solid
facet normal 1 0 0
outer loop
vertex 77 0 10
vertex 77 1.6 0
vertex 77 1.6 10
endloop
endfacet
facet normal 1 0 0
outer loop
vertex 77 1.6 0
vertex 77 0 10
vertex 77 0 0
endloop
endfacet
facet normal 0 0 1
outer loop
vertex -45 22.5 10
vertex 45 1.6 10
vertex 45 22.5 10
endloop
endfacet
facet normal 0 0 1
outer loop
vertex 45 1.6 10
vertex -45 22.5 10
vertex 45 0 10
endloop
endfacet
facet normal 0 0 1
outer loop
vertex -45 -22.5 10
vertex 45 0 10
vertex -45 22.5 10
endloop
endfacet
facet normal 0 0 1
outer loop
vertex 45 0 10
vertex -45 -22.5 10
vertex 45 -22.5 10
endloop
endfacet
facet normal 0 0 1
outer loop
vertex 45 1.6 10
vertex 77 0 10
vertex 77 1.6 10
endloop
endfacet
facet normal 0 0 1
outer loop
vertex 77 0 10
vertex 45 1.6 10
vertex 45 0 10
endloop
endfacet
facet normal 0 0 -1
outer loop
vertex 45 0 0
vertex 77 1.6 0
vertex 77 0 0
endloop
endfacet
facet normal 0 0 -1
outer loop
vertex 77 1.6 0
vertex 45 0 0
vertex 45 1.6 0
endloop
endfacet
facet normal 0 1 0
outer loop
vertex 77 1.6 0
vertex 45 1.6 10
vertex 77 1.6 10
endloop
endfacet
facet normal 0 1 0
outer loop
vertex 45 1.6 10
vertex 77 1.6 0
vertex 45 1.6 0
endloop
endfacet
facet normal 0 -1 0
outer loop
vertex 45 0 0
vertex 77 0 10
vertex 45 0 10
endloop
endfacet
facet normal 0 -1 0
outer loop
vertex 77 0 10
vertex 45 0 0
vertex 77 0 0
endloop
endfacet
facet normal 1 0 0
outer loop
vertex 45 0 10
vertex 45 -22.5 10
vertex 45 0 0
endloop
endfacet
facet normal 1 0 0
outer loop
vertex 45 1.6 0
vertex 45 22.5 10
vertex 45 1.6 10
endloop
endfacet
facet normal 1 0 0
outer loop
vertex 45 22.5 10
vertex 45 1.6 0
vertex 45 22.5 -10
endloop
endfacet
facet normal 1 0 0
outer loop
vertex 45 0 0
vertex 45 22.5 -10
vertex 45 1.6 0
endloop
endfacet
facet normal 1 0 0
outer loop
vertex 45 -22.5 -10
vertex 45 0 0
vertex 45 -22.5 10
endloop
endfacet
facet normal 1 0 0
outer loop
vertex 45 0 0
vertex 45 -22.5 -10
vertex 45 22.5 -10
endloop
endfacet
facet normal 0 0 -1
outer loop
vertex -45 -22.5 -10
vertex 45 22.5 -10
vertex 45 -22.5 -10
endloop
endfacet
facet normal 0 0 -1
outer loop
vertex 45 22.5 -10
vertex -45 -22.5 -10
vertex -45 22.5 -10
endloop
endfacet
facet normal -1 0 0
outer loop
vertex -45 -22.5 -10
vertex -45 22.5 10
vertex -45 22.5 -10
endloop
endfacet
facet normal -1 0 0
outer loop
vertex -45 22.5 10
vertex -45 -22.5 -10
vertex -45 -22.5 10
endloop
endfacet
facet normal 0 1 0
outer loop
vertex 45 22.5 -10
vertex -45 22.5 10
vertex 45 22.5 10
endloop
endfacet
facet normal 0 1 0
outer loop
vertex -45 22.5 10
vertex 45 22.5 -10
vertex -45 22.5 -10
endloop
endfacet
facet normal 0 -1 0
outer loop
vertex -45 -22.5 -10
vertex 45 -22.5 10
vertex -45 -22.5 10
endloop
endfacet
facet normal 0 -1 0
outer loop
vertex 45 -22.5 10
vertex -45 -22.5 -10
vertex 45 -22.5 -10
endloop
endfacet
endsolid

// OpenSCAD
// Dimensions for the Drying Rack
// Base Block Dimensions
base_length = 90;  // Length of the base block along X axis (mm)
base_width = 45;    // Width of the base block along Y axis (mm)
base_height = 20;   // Height of the base block along Z axis (mm)

// Slide Slot Dimensions
num_slots = 10;     // Number of slots to create
slot_length = 77;   // Length of each slot along X axis (mm)
slot_width = 1.6;    // Width of each slot along Y axis (mm)
slot_depth = 10;     // Depth of the slot along Z axis (mm)
slot_spacing = 3.5;  // Center-to-center spacing between slots in Y direction (mm)

// Slot Positioning Calculations
// The slots are centered on the block in X and Y.

// Calculate the total required width for the slots and gaps:
// Total span occupied by slots and gaps along Y axis:
// Span = (num_slots - 1) * slot_spacing + slot_width
total_span = (num_slots - 1) * slot_spacing + slot_width;

// Center of the block in Y: base_width / 2 = 45 / 2 = 22.5
y_center = base_width / 2;

// Calculate the starting position for the first slot's center (relative to origin)
start_y = y_center - (total_span / 2);

slot_positions = [];
for (i = [0 : num_slots - 1]) {
    // Center of the i-th slot: start_y + i * slot_spacing + slot_width / 2
    pos = start_y + i * slot_spacing + (slot_width / 2);
    slot_positions = concat(slot_positions, [pos]);
}


// --- Main Model ---

module drying_rack() {
    // 1. Base Block (Cuboid)
    // The block rests on the XY plane at z=0.
    cube([base_length, base_width, base_height], center = true);

    // 2. Slots (Cutouts)
    for (i = [0 : num_slots - 1]) {
        slot_y = slot_positions[i];

        // Create the slot using a moving cube/box for extrusion along Z
        translate([0, slot_y, 0]) {
            // The slot runs along X (length=77), has width=1.6 (Y), and depth=10 (Z)
            // Since the block height is 20mm, a depth of 10mm fits within the block.
            cube([slot_length, slot_width, slot_depth], center = false);
        }
    }
}

drying_rack();
